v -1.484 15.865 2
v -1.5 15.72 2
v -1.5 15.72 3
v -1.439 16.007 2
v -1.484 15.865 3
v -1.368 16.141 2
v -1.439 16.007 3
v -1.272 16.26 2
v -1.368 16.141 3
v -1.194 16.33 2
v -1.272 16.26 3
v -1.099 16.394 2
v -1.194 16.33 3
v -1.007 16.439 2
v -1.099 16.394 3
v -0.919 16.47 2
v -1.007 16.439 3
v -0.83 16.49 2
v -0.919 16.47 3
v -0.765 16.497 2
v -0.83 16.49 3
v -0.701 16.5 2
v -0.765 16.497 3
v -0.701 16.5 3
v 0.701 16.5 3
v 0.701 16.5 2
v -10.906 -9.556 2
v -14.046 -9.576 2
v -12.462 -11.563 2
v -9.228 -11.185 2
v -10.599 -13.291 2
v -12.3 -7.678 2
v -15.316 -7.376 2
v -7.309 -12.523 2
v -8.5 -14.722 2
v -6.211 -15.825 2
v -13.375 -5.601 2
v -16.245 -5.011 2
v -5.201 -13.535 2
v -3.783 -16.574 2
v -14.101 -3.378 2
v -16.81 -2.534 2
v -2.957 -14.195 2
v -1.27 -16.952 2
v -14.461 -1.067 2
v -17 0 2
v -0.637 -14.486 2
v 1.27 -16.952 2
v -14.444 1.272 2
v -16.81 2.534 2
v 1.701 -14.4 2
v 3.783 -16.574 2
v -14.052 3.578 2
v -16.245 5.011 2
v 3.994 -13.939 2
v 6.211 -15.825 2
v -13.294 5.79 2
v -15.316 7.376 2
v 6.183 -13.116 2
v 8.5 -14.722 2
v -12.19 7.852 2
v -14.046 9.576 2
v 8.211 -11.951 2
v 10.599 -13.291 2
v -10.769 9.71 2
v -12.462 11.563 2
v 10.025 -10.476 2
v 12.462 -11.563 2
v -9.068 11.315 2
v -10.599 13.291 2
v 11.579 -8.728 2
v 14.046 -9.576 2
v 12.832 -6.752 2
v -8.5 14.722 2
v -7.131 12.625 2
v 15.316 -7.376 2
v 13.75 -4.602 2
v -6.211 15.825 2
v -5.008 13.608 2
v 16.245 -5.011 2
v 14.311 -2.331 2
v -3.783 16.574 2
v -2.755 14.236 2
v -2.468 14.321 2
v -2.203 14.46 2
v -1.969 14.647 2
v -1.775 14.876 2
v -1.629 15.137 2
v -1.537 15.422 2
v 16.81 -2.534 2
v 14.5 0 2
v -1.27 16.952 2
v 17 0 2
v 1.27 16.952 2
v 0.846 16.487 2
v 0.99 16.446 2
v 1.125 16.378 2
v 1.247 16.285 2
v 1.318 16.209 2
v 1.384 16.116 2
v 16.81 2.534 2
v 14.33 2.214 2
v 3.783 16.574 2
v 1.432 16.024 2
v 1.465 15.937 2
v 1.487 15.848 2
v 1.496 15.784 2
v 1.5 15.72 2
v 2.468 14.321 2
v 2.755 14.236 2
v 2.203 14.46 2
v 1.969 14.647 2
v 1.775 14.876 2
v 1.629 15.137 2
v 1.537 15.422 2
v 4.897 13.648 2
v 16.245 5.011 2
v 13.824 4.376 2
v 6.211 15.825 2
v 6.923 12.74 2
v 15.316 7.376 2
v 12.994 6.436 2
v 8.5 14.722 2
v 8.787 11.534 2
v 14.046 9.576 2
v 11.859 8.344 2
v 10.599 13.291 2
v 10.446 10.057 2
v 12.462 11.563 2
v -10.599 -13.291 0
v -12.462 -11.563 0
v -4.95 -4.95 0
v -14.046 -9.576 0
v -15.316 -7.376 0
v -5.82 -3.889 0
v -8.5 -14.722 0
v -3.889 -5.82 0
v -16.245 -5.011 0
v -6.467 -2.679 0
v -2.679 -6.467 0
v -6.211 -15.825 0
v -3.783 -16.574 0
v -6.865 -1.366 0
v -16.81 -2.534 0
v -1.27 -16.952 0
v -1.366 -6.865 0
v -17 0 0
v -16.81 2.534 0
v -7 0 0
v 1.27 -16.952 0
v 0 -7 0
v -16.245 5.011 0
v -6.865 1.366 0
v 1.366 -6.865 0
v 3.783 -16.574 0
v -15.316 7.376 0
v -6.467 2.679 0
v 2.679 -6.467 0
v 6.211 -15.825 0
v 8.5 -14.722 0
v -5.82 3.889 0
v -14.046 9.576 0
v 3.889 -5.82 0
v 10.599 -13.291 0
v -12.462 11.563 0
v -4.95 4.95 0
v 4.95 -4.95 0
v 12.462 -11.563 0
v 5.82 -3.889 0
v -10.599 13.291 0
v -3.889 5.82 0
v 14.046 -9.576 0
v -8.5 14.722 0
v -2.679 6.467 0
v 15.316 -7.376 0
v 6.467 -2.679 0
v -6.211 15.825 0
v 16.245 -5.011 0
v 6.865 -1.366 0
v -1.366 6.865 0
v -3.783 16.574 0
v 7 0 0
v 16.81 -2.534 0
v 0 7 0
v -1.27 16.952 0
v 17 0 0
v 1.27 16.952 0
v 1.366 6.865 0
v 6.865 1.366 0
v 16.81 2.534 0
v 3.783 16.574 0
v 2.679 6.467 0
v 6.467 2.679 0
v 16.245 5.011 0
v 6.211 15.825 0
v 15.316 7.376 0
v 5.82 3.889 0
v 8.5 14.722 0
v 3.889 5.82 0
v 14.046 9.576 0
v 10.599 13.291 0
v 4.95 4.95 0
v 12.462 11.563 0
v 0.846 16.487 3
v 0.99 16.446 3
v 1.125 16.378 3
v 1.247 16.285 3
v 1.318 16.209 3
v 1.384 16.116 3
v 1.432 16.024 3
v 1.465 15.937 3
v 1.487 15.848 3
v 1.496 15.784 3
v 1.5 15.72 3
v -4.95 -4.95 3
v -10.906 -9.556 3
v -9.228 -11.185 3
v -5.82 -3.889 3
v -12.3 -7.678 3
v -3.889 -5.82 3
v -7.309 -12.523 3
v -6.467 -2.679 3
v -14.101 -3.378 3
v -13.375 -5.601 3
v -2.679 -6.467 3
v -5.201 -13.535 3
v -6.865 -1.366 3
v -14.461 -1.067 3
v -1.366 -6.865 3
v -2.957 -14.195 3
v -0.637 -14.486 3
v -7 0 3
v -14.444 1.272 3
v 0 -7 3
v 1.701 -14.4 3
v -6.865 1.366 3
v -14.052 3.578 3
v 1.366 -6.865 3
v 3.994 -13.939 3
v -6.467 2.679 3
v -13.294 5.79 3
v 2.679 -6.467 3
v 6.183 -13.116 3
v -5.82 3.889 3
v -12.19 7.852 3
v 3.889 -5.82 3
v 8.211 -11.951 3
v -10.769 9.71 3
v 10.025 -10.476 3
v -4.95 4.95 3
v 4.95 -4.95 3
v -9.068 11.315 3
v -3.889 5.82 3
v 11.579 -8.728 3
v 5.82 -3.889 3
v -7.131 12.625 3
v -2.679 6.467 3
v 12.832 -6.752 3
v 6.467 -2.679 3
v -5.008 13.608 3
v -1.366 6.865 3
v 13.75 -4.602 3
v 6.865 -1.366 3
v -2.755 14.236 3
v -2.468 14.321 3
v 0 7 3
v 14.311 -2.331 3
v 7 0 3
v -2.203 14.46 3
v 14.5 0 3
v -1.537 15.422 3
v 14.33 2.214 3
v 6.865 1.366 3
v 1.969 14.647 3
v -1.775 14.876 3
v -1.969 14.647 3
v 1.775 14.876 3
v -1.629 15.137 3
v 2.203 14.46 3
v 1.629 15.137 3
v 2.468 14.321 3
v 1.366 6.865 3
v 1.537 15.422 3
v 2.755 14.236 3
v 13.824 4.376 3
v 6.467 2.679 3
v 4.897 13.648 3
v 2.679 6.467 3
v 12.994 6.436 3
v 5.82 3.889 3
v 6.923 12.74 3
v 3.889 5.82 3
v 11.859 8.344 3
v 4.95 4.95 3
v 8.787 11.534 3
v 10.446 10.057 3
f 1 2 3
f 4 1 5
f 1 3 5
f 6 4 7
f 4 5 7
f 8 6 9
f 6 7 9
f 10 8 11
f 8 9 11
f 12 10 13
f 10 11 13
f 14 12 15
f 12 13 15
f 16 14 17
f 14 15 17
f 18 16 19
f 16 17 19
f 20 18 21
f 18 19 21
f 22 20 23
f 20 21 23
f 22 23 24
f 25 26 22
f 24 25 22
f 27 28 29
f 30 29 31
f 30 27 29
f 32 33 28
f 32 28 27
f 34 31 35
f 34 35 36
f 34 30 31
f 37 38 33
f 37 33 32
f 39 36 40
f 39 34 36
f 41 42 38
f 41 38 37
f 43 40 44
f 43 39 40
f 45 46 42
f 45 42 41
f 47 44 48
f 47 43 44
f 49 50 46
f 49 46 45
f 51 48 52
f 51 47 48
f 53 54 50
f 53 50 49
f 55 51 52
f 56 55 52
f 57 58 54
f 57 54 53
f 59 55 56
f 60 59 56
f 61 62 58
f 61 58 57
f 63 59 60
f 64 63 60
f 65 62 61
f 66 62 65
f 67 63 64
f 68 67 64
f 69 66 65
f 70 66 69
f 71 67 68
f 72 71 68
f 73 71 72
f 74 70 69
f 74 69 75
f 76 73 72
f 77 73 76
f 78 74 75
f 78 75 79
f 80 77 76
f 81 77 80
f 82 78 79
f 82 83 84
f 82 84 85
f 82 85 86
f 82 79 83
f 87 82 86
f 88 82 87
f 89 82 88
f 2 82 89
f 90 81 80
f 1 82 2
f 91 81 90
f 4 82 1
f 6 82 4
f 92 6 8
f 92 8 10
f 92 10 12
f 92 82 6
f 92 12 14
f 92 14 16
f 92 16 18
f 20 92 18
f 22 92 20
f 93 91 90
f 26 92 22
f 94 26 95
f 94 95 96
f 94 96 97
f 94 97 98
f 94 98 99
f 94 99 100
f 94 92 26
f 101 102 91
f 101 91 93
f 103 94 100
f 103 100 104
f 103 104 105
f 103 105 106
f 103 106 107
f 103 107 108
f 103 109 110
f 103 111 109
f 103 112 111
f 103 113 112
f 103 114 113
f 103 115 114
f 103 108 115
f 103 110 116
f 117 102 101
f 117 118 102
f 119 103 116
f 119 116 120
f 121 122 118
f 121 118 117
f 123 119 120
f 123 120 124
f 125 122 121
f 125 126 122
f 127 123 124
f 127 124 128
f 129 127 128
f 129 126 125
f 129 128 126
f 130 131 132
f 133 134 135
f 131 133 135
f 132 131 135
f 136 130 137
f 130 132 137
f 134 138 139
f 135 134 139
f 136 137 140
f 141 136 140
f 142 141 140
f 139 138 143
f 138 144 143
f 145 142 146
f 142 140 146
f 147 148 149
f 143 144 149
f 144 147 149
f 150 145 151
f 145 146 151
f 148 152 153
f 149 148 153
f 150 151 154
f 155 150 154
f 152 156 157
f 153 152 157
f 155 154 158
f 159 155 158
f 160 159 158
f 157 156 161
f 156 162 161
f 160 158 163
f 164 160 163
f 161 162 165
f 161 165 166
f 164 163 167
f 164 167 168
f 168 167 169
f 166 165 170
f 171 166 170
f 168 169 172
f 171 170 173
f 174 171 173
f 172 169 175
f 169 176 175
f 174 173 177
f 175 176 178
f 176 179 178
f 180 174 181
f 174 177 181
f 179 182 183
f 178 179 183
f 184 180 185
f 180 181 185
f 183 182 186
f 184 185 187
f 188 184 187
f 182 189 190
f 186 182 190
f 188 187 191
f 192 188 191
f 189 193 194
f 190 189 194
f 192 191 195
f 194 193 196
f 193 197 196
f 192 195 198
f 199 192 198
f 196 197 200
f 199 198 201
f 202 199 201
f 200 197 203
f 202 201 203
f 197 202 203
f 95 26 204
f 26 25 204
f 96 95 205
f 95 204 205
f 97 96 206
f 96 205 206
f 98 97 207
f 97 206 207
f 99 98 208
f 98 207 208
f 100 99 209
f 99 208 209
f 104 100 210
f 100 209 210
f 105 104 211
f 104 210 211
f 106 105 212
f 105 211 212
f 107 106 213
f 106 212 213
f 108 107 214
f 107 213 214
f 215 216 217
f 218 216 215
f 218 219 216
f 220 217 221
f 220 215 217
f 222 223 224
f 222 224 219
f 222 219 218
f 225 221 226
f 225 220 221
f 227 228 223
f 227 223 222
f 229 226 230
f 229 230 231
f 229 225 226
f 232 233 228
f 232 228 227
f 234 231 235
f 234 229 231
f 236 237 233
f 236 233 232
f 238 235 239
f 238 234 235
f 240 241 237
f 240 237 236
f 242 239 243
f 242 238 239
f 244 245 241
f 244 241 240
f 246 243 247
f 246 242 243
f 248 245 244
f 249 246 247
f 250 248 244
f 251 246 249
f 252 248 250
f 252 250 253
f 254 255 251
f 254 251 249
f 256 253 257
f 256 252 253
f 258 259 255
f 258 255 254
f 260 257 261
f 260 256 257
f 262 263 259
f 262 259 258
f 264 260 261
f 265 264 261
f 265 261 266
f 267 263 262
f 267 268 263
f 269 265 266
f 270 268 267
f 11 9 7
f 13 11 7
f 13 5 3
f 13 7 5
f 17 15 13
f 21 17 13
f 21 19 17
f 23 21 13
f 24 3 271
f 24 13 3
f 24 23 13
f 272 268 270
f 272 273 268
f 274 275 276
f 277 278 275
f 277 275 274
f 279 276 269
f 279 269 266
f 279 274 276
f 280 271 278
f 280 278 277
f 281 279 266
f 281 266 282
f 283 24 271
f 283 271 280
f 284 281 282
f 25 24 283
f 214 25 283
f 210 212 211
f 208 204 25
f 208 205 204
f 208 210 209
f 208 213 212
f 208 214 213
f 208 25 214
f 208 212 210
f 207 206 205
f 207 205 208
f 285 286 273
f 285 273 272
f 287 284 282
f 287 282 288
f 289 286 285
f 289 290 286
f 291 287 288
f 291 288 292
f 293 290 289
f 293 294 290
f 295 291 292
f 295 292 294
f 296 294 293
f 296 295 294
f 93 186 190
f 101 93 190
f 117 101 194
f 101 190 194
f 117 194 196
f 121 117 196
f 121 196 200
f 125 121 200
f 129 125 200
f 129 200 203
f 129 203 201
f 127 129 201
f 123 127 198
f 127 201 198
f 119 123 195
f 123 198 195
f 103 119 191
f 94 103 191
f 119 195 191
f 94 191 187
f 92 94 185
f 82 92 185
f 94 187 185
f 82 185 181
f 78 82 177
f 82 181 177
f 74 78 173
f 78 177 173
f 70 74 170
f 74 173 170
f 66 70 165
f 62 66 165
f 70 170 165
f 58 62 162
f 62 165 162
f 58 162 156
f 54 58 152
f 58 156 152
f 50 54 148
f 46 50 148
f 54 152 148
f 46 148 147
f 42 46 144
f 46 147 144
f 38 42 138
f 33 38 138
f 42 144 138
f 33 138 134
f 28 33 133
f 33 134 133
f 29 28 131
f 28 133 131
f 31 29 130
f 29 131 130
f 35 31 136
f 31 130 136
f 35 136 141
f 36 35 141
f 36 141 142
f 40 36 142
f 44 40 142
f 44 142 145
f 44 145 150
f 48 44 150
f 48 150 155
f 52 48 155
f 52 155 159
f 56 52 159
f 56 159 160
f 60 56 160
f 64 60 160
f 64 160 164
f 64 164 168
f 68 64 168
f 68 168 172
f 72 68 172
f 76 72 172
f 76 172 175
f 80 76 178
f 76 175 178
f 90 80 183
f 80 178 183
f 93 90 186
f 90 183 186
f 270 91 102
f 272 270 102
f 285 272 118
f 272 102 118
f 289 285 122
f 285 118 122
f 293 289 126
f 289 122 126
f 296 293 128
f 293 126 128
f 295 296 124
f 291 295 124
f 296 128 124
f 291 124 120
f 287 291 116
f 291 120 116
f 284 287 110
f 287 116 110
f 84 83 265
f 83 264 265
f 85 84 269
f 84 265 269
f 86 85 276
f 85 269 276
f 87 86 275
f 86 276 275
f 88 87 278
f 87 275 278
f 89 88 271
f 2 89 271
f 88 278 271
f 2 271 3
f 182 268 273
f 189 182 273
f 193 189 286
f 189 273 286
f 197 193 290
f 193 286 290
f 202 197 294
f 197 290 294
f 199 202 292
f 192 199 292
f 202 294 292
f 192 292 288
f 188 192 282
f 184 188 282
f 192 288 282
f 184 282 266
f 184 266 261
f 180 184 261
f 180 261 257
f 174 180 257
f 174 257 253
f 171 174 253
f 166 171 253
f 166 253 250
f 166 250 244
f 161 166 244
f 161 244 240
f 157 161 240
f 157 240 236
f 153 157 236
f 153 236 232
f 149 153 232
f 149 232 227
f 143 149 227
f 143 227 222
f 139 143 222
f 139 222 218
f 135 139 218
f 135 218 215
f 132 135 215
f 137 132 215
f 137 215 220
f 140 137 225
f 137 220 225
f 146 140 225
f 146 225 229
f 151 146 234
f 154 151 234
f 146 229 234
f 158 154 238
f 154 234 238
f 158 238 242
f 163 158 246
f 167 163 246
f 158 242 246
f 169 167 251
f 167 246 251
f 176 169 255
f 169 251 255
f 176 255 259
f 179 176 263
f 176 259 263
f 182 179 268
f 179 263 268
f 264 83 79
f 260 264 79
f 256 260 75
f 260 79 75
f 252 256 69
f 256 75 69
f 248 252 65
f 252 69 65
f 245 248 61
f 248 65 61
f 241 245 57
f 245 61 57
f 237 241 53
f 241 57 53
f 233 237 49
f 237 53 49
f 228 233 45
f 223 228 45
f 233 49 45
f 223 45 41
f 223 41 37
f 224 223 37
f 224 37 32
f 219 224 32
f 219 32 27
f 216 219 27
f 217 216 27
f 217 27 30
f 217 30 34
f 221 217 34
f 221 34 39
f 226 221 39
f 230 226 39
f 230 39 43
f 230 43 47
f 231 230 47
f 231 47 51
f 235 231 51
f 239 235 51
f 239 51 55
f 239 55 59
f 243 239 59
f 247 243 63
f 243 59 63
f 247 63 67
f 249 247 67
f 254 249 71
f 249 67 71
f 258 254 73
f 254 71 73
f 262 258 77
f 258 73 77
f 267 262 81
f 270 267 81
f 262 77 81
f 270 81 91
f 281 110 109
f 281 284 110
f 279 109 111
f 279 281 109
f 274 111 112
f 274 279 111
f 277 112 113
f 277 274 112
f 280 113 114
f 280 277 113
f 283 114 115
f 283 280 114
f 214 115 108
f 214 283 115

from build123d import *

# Parameters (mm, degrees)
SKETCH_1_R          = 17
EXTRUDE_1_DEPTH     = 2
EXTRUDE_2_DEPTH     = 1
FILLET_1_R          = 1.55
FILLET_2_R          = 0.8
SKETCH_3_R          = 7
CUT_EXTRUDE_1_DEPTH = 25.22808302


with BuildPart() as part:
    # ｽｹｯﾁ1 → ﾎﾞｽ - 押し出し1 (new body)
    with BuildSketch(Plane.XY):
        Circle(SKETCH_1_R)
    extrude(amount=EXTRUDE_1_DEPTH)

    # ｽｹｯﾁ2 → ﾎﾞｽ - 押し出し2 (add)
    with BuildSketch(Plane.XY.offset(2)):
        with BuildLine():
            Line((-1.5, 14.422205102), (-1.5, 12.5))
            Line((-1.5, 12.5), (1.5, 12.5))
            Line((1.5, 12.5), (1.5, 14.422205102))
            ThreePointArc((1.5, 14.422205102), (0, 14.5), (-1.5, 14.422205102))
        make_face()
        with BuildLine():
            Line((1.5, 12.5), (-1.5, 12.5))
            Line((-1.5, 12.5), (-1.5, 14.422205102))
            ThreePointArc((-1.5, 14.422205102), (-9.708243919, -10.770329614), (14.5, 0))
            ThreePointArc((14.5, 0), (10.770329614, 9.708243919), (1.5, 14.422205102))
            Line((1.5, 14.422205102), (1.5, 12.5))
        make_face()
        with BuildLine():
            Line((-1.5, 16.5), (-1.5, 14.422205102))
            ThreePointArc((-1.5, 14.422205102), (0, 14.5), (1.5, 14.422205102))
            Line((1.5, 14.422205102), (1.5, 16.5))
            Line((1.5, 16.5), (-1.5, 16.5))
        make_face()
    extrude(amount=EXTRUDE_2_DEPTH)

    # ﾌｨﾚｯﾄ1
    fillet_1_edges = [part.edges().sort_by_distance(p)[0] for p in [
        (-1.5, 14.422205102, 2.5),
        (1.5, 14.422205102, 2.5),
    ]]
    fillet(fillet_1_edges, radius=FILLET_1_R)

    # ﾌｨﾚｯﾄ2
    fillet_2_edges = [part.edges().sort_by_distance(p)[0] for p in [
        (1.5, 16.5, 2.5),
        (-1.5, 16.5, 2.5),
    ]]
    fillet(fillet_2_edges, radius=FILLET_2_R)

    # ｽｹｯﾁ3 → ｶｯﾄ - 押し出し1 (cut, through all)
    with BuildSketch(Plane.XY.offset(3)):
        Circle(SKETCH_3_R)
    extrude(amount=-CUT_EXTRUDE_1_DEPTH, mode=Mode.SUBTRACT)


solid = part.part
